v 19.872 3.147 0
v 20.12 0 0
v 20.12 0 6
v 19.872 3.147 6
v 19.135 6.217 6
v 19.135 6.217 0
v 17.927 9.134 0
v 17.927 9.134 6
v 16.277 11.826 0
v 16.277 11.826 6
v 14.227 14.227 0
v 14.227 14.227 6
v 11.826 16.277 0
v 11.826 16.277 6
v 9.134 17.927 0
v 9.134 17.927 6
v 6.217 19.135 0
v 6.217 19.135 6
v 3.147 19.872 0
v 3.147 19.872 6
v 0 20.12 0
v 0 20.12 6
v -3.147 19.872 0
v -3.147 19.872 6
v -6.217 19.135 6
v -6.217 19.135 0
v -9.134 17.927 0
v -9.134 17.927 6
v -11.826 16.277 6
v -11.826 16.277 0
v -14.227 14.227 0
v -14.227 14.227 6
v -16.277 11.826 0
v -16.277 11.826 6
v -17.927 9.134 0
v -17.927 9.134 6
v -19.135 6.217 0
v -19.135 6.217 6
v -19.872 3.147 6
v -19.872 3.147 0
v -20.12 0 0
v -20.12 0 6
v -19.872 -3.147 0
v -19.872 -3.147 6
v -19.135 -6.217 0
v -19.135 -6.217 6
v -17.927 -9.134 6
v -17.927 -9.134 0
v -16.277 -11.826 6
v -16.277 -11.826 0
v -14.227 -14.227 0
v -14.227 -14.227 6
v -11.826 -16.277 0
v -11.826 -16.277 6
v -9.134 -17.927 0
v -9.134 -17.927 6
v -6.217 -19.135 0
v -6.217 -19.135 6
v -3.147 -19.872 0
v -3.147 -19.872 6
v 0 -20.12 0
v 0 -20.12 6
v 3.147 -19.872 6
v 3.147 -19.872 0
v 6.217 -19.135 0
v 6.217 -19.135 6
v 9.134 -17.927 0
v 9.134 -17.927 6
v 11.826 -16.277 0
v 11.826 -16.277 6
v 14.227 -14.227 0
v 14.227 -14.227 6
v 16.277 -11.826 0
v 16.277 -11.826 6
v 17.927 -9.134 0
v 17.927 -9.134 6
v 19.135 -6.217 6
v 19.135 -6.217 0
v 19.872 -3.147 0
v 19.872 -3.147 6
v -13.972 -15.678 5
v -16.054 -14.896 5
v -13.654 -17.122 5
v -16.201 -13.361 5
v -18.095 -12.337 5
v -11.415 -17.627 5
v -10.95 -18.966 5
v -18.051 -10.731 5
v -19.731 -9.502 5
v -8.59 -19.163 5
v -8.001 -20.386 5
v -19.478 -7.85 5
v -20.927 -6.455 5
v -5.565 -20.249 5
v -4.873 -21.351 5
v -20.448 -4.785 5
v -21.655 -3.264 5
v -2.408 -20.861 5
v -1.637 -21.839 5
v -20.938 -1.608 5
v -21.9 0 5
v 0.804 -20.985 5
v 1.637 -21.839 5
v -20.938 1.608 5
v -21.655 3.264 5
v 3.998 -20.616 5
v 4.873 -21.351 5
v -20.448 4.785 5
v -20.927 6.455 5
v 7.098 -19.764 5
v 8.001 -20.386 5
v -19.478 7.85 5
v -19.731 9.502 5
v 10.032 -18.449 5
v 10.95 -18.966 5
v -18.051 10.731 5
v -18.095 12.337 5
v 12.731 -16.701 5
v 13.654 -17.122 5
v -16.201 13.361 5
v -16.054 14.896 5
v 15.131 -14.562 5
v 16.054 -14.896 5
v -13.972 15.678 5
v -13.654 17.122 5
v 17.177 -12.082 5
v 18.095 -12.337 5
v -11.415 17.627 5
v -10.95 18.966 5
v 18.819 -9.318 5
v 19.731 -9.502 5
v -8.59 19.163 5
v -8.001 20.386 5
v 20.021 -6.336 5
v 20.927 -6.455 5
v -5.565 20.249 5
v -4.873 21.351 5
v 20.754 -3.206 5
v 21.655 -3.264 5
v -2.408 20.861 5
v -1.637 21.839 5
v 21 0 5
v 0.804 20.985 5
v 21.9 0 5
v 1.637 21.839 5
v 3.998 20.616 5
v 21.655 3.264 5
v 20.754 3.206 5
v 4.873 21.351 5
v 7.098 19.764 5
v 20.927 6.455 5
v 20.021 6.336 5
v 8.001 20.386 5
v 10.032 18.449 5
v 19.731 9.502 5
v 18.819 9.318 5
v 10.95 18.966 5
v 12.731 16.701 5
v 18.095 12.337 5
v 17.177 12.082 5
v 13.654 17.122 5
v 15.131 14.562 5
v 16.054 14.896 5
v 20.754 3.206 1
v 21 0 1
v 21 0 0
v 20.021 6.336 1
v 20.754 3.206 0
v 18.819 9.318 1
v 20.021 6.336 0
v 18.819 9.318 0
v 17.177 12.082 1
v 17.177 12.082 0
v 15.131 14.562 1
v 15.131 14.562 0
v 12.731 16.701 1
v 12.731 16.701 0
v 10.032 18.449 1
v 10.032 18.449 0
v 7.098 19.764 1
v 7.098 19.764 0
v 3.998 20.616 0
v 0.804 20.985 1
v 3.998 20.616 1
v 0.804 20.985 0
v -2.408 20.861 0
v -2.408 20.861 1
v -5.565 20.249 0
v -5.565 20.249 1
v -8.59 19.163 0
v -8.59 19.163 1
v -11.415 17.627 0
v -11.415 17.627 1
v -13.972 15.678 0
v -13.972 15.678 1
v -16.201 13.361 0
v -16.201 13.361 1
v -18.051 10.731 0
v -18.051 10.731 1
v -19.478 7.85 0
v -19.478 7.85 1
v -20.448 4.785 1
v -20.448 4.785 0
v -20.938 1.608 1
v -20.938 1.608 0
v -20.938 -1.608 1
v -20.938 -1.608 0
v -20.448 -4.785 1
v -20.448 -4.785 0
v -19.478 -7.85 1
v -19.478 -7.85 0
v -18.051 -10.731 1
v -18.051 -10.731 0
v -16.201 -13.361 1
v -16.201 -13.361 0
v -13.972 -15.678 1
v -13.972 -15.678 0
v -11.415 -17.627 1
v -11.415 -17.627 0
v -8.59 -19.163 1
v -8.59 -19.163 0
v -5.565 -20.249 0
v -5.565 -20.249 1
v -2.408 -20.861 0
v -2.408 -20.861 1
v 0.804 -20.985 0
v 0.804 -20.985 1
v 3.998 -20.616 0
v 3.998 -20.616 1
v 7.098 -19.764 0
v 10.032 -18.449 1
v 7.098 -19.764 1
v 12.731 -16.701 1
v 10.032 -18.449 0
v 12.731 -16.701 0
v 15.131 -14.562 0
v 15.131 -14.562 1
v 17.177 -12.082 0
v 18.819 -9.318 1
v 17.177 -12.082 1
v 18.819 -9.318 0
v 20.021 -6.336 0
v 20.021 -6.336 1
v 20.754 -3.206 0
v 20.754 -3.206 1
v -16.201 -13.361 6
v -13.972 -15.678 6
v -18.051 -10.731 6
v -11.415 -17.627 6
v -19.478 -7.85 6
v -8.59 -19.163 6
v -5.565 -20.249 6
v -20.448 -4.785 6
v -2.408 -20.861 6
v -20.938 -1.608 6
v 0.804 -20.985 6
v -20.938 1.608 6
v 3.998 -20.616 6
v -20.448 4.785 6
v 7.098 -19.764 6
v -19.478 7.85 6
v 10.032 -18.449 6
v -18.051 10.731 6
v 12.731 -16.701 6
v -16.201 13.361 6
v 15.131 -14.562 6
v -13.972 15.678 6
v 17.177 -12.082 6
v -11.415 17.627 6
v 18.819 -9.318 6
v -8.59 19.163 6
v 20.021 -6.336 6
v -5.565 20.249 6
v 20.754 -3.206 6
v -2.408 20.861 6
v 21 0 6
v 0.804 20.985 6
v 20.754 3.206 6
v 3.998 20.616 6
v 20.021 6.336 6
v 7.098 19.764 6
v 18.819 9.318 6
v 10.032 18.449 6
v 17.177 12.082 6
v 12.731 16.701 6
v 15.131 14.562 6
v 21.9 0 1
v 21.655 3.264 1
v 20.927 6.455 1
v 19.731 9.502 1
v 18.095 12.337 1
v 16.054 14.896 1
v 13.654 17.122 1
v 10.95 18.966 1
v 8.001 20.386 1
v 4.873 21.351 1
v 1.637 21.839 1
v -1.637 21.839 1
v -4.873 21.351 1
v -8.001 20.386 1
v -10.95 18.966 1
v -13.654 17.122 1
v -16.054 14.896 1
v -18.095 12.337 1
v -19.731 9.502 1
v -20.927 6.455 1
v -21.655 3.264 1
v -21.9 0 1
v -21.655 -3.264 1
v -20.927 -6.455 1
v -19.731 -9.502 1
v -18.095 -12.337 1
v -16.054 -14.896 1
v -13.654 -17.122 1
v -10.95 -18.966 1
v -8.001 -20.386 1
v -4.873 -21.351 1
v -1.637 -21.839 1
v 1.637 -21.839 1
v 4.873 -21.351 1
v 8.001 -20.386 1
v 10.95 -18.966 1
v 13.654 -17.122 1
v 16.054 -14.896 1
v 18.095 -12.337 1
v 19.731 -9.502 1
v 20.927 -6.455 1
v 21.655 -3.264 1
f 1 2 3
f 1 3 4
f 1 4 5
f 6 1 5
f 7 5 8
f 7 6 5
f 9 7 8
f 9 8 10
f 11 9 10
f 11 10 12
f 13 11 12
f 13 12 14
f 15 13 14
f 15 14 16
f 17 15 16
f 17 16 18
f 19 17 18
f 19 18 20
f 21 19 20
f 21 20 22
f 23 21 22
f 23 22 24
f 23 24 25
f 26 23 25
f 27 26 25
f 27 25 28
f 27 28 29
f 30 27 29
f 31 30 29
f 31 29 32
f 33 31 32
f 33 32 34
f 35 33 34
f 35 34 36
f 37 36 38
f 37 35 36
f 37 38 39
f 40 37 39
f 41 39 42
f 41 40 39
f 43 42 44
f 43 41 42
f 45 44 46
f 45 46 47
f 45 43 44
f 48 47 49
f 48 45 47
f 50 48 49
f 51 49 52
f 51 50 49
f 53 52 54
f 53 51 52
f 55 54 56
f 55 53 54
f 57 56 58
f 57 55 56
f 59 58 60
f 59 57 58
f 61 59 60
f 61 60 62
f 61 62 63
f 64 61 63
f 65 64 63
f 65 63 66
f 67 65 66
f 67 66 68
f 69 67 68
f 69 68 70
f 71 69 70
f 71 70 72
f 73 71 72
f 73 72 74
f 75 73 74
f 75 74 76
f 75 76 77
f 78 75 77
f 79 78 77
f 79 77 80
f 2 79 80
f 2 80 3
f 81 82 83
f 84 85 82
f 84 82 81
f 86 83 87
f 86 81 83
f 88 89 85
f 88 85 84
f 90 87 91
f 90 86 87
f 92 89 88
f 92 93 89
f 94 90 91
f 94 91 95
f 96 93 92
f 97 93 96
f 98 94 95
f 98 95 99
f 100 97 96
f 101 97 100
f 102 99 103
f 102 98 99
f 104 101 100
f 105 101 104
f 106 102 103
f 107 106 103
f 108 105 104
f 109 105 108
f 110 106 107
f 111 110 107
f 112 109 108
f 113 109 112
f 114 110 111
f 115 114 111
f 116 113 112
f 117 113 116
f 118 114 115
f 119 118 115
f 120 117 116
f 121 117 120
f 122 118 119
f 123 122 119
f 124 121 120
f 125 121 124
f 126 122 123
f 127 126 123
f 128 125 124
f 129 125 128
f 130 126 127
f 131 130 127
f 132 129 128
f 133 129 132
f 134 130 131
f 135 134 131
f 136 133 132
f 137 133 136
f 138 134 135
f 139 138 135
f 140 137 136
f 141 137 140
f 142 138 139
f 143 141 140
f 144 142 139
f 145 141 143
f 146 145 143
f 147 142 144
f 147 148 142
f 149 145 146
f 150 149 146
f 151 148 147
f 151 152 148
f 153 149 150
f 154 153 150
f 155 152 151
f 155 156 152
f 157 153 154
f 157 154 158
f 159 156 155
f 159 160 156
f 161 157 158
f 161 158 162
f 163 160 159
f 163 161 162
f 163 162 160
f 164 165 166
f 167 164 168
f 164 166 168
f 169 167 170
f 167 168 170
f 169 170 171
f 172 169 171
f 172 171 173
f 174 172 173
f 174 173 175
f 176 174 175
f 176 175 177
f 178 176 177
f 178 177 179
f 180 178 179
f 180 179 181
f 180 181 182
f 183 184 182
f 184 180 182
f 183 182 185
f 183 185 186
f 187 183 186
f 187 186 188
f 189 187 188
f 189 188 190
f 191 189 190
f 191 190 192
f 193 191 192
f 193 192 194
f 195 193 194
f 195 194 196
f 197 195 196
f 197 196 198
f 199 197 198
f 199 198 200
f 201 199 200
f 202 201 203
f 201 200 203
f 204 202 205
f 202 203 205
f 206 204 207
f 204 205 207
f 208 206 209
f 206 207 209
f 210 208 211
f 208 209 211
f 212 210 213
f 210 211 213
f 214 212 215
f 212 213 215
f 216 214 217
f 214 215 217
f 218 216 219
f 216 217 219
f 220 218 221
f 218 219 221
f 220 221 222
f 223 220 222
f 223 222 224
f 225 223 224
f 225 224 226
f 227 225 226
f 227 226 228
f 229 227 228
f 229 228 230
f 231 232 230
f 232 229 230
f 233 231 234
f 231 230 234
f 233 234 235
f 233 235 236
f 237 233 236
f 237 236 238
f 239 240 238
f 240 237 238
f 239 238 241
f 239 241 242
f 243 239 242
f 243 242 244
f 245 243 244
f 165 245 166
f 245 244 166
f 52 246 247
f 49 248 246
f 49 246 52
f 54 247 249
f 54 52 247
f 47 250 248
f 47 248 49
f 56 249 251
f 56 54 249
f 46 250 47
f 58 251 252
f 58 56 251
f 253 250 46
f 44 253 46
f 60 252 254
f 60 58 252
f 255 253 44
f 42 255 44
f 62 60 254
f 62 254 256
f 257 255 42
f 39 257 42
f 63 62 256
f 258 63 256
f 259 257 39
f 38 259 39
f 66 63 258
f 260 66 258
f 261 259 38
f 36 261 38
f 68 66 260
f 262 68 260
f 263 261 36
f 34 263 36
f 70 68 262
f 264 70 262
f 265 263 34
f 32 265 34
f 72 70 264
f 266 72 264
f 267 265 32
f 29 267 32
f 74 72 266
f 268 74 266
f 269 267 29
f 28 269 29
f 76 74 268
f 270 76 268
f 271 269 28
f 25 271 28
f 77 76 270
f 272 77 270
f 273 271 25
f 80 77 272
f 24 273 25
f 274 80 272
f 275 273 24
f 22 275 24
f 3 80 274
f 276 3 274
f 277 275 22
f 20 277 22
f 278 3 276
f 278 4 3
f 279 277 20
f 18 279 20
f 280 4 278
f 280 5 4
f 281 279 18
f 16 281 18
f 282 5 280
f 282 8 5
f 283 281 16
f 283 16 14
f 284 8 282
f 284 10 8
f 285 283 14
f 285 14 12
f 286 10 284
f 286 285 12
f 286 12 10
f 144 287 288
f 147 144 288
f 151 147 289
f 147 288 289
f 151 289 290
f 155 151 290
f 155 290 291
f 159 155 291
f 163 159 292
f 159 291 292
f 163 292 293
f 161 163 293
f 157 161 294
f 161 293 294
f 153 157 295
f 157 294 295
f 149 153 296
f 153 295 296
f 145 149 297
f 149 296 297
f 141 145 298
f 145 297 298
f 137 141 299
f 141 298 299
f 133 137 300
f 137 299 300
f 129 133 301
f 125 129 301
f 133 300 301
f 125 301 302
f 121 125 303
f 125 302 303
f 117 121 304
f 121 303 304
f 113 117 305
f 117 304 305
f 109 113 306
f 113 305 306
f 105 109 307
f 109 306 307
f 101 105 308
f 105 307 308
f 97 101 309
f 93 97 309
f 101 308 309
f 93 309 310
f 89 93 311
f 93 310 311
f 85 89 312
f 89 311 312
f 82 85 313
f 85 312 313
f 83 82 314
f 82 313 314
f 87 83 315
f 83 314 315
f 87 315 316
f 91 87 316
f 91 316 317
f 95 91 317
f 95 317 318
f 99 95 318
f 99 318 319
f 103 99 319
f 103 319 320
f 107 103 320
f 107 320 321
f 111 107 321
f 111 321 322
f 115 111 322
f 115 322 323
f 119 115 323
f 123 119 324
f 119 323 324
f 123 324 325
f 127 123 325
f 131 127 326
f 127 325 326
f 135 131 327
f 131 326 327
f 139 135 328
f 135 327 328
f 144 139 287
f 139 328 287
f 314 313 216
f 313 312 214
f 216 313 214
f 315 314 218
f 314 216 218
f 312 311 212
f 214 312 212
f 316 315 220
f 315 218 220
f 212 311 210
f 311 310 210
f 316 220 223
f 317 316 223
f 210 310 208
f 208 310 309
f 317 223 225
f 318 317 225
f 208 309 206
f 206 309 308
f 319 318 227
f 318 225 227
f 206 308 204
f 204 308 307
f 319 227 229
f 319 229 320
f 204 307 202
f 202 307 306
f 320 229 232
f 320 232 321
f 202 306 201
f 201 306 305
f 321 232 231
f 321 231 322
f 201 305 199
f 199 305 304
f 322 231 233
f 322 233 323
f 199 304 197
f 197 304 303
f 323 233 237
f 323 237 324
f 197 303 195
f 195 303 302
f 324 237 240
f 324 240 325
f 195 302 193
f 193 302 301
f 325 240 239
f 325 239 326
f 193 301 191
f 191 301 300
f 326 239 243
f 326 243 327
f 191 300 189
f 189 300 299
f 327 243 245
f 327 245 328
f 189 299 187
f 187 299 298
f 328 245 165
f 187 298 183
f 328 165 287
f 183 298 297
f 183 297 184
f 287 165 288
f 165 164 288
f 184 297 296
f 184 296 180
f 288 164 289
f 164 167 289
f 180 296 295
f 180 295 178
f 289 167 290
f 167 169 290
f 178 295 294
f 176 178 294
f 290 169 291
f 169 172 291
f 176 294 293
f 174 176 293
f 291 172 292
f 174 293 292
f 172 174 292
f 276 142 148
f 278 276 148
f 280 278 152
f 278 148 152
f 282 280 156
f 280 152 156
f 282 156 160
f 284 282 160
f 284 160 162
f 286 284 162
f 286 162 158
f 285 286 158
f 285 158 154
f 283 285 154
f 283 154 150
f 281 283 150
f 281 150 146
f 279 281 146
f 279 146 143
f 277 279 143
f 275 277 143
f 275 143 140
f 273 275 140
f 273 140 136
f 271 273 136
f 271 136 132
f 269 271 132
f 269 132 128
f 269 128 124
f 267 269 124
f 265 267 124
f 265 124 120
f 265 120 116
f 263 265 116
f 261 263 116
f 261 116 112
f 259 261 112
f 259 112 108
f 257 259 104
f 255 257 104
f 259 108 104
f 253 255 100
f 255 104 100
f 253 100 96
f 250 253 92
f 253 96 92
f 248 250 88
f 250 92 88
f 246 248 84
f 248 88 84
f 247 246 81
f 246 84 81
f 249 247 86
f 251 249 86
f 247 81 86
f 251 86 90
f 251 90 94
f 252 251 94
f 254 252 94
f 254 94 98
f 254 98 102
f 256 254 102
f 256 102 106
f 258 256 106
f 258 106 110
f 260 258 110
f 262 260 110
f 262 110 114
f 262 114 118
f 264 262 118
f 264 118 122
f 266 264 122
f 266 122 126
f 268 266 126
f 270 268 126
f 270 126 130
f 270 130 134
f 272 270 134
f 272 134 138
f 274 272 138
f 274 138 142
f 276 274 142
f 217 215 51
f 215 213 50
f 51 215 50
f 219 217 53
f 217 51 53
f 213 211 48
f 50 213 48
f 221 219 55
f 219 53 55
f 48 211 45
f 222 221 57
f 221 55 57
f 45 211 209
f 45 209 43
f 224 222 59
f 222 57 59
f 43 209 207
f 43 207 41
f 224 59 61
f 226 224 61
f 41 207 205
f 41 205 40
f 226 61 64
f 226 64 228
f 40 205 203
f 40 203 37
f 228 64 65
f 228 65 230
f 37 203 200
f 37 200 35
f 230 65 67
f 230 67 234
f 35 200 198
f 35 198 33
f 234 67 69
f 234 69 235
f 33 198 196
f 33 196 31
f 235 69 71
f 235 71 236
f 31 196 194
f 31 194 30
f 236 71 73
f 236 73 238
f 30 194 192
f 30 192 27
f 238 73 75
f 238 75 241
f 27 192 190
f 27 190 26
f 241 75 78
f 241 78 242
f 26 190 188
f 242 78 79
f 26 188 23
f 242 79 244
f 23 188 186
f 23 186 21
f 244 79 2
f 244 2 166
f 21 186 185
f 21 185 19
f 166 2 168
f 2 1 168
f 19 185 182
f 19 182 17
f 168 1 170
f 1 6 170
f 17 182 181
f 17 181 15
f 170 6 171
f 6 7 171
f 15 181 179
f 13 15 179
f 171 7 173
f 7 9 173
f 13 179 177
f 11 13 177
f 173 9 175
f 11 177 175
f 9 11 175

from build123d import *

# Parameters (mm, degrees)
S01_INNER_RACE_CONTACT_LIPS_R         = 21
S01_INNER_RACE_CONTACT_LIPS_R_2       = 20.12
F_01_INNER_RACE_CONTACT_LIPS_DEPTH    = 6
F_02_START                            = 1
S02_STIFFENED_MIDDLE_OF_SPACER_R      = 21.9
S02_STIFFENED_MIDDLE_OF_SPACER_R_2    = 20.12
F_02_STIFFENED_MIDDLE_OF_SPACER_DEPTH = 4


with BuildPart() as part:
    # S01 - Inner race contact lips → 01 - Inner race contact lips (new body)
    with BuildSketch(Plane.XY):
        Circle(S01_INNER_RACE_CONTACT_LIPS_R)
        Circle(S01_INNER_RACE_CONTACT_LIPS_R_2, mode=Mode.SUBTRACT)
    extrude(amount=F_01_INNER_RACE_CONTACT_LIPS_DEPTH)

    # S02 - Stiffened middle of spacer → 02 - Stiffened middle of spacer (add)
    with BuildSketch(Plane.XY.offset(F_02_START)):
        Circle(S02_STIFFENED_MIDDLE_OF_SPACER_R)
        Circle(S02_STIFFENED_MIDDLE_OF_SPACER_R_2, mode=Mode.SUBTRACT)
    extrude(amount=F_02_STIFFENED_MIDDLE_OF_SPACER_DEPTH)


solid = part.part
